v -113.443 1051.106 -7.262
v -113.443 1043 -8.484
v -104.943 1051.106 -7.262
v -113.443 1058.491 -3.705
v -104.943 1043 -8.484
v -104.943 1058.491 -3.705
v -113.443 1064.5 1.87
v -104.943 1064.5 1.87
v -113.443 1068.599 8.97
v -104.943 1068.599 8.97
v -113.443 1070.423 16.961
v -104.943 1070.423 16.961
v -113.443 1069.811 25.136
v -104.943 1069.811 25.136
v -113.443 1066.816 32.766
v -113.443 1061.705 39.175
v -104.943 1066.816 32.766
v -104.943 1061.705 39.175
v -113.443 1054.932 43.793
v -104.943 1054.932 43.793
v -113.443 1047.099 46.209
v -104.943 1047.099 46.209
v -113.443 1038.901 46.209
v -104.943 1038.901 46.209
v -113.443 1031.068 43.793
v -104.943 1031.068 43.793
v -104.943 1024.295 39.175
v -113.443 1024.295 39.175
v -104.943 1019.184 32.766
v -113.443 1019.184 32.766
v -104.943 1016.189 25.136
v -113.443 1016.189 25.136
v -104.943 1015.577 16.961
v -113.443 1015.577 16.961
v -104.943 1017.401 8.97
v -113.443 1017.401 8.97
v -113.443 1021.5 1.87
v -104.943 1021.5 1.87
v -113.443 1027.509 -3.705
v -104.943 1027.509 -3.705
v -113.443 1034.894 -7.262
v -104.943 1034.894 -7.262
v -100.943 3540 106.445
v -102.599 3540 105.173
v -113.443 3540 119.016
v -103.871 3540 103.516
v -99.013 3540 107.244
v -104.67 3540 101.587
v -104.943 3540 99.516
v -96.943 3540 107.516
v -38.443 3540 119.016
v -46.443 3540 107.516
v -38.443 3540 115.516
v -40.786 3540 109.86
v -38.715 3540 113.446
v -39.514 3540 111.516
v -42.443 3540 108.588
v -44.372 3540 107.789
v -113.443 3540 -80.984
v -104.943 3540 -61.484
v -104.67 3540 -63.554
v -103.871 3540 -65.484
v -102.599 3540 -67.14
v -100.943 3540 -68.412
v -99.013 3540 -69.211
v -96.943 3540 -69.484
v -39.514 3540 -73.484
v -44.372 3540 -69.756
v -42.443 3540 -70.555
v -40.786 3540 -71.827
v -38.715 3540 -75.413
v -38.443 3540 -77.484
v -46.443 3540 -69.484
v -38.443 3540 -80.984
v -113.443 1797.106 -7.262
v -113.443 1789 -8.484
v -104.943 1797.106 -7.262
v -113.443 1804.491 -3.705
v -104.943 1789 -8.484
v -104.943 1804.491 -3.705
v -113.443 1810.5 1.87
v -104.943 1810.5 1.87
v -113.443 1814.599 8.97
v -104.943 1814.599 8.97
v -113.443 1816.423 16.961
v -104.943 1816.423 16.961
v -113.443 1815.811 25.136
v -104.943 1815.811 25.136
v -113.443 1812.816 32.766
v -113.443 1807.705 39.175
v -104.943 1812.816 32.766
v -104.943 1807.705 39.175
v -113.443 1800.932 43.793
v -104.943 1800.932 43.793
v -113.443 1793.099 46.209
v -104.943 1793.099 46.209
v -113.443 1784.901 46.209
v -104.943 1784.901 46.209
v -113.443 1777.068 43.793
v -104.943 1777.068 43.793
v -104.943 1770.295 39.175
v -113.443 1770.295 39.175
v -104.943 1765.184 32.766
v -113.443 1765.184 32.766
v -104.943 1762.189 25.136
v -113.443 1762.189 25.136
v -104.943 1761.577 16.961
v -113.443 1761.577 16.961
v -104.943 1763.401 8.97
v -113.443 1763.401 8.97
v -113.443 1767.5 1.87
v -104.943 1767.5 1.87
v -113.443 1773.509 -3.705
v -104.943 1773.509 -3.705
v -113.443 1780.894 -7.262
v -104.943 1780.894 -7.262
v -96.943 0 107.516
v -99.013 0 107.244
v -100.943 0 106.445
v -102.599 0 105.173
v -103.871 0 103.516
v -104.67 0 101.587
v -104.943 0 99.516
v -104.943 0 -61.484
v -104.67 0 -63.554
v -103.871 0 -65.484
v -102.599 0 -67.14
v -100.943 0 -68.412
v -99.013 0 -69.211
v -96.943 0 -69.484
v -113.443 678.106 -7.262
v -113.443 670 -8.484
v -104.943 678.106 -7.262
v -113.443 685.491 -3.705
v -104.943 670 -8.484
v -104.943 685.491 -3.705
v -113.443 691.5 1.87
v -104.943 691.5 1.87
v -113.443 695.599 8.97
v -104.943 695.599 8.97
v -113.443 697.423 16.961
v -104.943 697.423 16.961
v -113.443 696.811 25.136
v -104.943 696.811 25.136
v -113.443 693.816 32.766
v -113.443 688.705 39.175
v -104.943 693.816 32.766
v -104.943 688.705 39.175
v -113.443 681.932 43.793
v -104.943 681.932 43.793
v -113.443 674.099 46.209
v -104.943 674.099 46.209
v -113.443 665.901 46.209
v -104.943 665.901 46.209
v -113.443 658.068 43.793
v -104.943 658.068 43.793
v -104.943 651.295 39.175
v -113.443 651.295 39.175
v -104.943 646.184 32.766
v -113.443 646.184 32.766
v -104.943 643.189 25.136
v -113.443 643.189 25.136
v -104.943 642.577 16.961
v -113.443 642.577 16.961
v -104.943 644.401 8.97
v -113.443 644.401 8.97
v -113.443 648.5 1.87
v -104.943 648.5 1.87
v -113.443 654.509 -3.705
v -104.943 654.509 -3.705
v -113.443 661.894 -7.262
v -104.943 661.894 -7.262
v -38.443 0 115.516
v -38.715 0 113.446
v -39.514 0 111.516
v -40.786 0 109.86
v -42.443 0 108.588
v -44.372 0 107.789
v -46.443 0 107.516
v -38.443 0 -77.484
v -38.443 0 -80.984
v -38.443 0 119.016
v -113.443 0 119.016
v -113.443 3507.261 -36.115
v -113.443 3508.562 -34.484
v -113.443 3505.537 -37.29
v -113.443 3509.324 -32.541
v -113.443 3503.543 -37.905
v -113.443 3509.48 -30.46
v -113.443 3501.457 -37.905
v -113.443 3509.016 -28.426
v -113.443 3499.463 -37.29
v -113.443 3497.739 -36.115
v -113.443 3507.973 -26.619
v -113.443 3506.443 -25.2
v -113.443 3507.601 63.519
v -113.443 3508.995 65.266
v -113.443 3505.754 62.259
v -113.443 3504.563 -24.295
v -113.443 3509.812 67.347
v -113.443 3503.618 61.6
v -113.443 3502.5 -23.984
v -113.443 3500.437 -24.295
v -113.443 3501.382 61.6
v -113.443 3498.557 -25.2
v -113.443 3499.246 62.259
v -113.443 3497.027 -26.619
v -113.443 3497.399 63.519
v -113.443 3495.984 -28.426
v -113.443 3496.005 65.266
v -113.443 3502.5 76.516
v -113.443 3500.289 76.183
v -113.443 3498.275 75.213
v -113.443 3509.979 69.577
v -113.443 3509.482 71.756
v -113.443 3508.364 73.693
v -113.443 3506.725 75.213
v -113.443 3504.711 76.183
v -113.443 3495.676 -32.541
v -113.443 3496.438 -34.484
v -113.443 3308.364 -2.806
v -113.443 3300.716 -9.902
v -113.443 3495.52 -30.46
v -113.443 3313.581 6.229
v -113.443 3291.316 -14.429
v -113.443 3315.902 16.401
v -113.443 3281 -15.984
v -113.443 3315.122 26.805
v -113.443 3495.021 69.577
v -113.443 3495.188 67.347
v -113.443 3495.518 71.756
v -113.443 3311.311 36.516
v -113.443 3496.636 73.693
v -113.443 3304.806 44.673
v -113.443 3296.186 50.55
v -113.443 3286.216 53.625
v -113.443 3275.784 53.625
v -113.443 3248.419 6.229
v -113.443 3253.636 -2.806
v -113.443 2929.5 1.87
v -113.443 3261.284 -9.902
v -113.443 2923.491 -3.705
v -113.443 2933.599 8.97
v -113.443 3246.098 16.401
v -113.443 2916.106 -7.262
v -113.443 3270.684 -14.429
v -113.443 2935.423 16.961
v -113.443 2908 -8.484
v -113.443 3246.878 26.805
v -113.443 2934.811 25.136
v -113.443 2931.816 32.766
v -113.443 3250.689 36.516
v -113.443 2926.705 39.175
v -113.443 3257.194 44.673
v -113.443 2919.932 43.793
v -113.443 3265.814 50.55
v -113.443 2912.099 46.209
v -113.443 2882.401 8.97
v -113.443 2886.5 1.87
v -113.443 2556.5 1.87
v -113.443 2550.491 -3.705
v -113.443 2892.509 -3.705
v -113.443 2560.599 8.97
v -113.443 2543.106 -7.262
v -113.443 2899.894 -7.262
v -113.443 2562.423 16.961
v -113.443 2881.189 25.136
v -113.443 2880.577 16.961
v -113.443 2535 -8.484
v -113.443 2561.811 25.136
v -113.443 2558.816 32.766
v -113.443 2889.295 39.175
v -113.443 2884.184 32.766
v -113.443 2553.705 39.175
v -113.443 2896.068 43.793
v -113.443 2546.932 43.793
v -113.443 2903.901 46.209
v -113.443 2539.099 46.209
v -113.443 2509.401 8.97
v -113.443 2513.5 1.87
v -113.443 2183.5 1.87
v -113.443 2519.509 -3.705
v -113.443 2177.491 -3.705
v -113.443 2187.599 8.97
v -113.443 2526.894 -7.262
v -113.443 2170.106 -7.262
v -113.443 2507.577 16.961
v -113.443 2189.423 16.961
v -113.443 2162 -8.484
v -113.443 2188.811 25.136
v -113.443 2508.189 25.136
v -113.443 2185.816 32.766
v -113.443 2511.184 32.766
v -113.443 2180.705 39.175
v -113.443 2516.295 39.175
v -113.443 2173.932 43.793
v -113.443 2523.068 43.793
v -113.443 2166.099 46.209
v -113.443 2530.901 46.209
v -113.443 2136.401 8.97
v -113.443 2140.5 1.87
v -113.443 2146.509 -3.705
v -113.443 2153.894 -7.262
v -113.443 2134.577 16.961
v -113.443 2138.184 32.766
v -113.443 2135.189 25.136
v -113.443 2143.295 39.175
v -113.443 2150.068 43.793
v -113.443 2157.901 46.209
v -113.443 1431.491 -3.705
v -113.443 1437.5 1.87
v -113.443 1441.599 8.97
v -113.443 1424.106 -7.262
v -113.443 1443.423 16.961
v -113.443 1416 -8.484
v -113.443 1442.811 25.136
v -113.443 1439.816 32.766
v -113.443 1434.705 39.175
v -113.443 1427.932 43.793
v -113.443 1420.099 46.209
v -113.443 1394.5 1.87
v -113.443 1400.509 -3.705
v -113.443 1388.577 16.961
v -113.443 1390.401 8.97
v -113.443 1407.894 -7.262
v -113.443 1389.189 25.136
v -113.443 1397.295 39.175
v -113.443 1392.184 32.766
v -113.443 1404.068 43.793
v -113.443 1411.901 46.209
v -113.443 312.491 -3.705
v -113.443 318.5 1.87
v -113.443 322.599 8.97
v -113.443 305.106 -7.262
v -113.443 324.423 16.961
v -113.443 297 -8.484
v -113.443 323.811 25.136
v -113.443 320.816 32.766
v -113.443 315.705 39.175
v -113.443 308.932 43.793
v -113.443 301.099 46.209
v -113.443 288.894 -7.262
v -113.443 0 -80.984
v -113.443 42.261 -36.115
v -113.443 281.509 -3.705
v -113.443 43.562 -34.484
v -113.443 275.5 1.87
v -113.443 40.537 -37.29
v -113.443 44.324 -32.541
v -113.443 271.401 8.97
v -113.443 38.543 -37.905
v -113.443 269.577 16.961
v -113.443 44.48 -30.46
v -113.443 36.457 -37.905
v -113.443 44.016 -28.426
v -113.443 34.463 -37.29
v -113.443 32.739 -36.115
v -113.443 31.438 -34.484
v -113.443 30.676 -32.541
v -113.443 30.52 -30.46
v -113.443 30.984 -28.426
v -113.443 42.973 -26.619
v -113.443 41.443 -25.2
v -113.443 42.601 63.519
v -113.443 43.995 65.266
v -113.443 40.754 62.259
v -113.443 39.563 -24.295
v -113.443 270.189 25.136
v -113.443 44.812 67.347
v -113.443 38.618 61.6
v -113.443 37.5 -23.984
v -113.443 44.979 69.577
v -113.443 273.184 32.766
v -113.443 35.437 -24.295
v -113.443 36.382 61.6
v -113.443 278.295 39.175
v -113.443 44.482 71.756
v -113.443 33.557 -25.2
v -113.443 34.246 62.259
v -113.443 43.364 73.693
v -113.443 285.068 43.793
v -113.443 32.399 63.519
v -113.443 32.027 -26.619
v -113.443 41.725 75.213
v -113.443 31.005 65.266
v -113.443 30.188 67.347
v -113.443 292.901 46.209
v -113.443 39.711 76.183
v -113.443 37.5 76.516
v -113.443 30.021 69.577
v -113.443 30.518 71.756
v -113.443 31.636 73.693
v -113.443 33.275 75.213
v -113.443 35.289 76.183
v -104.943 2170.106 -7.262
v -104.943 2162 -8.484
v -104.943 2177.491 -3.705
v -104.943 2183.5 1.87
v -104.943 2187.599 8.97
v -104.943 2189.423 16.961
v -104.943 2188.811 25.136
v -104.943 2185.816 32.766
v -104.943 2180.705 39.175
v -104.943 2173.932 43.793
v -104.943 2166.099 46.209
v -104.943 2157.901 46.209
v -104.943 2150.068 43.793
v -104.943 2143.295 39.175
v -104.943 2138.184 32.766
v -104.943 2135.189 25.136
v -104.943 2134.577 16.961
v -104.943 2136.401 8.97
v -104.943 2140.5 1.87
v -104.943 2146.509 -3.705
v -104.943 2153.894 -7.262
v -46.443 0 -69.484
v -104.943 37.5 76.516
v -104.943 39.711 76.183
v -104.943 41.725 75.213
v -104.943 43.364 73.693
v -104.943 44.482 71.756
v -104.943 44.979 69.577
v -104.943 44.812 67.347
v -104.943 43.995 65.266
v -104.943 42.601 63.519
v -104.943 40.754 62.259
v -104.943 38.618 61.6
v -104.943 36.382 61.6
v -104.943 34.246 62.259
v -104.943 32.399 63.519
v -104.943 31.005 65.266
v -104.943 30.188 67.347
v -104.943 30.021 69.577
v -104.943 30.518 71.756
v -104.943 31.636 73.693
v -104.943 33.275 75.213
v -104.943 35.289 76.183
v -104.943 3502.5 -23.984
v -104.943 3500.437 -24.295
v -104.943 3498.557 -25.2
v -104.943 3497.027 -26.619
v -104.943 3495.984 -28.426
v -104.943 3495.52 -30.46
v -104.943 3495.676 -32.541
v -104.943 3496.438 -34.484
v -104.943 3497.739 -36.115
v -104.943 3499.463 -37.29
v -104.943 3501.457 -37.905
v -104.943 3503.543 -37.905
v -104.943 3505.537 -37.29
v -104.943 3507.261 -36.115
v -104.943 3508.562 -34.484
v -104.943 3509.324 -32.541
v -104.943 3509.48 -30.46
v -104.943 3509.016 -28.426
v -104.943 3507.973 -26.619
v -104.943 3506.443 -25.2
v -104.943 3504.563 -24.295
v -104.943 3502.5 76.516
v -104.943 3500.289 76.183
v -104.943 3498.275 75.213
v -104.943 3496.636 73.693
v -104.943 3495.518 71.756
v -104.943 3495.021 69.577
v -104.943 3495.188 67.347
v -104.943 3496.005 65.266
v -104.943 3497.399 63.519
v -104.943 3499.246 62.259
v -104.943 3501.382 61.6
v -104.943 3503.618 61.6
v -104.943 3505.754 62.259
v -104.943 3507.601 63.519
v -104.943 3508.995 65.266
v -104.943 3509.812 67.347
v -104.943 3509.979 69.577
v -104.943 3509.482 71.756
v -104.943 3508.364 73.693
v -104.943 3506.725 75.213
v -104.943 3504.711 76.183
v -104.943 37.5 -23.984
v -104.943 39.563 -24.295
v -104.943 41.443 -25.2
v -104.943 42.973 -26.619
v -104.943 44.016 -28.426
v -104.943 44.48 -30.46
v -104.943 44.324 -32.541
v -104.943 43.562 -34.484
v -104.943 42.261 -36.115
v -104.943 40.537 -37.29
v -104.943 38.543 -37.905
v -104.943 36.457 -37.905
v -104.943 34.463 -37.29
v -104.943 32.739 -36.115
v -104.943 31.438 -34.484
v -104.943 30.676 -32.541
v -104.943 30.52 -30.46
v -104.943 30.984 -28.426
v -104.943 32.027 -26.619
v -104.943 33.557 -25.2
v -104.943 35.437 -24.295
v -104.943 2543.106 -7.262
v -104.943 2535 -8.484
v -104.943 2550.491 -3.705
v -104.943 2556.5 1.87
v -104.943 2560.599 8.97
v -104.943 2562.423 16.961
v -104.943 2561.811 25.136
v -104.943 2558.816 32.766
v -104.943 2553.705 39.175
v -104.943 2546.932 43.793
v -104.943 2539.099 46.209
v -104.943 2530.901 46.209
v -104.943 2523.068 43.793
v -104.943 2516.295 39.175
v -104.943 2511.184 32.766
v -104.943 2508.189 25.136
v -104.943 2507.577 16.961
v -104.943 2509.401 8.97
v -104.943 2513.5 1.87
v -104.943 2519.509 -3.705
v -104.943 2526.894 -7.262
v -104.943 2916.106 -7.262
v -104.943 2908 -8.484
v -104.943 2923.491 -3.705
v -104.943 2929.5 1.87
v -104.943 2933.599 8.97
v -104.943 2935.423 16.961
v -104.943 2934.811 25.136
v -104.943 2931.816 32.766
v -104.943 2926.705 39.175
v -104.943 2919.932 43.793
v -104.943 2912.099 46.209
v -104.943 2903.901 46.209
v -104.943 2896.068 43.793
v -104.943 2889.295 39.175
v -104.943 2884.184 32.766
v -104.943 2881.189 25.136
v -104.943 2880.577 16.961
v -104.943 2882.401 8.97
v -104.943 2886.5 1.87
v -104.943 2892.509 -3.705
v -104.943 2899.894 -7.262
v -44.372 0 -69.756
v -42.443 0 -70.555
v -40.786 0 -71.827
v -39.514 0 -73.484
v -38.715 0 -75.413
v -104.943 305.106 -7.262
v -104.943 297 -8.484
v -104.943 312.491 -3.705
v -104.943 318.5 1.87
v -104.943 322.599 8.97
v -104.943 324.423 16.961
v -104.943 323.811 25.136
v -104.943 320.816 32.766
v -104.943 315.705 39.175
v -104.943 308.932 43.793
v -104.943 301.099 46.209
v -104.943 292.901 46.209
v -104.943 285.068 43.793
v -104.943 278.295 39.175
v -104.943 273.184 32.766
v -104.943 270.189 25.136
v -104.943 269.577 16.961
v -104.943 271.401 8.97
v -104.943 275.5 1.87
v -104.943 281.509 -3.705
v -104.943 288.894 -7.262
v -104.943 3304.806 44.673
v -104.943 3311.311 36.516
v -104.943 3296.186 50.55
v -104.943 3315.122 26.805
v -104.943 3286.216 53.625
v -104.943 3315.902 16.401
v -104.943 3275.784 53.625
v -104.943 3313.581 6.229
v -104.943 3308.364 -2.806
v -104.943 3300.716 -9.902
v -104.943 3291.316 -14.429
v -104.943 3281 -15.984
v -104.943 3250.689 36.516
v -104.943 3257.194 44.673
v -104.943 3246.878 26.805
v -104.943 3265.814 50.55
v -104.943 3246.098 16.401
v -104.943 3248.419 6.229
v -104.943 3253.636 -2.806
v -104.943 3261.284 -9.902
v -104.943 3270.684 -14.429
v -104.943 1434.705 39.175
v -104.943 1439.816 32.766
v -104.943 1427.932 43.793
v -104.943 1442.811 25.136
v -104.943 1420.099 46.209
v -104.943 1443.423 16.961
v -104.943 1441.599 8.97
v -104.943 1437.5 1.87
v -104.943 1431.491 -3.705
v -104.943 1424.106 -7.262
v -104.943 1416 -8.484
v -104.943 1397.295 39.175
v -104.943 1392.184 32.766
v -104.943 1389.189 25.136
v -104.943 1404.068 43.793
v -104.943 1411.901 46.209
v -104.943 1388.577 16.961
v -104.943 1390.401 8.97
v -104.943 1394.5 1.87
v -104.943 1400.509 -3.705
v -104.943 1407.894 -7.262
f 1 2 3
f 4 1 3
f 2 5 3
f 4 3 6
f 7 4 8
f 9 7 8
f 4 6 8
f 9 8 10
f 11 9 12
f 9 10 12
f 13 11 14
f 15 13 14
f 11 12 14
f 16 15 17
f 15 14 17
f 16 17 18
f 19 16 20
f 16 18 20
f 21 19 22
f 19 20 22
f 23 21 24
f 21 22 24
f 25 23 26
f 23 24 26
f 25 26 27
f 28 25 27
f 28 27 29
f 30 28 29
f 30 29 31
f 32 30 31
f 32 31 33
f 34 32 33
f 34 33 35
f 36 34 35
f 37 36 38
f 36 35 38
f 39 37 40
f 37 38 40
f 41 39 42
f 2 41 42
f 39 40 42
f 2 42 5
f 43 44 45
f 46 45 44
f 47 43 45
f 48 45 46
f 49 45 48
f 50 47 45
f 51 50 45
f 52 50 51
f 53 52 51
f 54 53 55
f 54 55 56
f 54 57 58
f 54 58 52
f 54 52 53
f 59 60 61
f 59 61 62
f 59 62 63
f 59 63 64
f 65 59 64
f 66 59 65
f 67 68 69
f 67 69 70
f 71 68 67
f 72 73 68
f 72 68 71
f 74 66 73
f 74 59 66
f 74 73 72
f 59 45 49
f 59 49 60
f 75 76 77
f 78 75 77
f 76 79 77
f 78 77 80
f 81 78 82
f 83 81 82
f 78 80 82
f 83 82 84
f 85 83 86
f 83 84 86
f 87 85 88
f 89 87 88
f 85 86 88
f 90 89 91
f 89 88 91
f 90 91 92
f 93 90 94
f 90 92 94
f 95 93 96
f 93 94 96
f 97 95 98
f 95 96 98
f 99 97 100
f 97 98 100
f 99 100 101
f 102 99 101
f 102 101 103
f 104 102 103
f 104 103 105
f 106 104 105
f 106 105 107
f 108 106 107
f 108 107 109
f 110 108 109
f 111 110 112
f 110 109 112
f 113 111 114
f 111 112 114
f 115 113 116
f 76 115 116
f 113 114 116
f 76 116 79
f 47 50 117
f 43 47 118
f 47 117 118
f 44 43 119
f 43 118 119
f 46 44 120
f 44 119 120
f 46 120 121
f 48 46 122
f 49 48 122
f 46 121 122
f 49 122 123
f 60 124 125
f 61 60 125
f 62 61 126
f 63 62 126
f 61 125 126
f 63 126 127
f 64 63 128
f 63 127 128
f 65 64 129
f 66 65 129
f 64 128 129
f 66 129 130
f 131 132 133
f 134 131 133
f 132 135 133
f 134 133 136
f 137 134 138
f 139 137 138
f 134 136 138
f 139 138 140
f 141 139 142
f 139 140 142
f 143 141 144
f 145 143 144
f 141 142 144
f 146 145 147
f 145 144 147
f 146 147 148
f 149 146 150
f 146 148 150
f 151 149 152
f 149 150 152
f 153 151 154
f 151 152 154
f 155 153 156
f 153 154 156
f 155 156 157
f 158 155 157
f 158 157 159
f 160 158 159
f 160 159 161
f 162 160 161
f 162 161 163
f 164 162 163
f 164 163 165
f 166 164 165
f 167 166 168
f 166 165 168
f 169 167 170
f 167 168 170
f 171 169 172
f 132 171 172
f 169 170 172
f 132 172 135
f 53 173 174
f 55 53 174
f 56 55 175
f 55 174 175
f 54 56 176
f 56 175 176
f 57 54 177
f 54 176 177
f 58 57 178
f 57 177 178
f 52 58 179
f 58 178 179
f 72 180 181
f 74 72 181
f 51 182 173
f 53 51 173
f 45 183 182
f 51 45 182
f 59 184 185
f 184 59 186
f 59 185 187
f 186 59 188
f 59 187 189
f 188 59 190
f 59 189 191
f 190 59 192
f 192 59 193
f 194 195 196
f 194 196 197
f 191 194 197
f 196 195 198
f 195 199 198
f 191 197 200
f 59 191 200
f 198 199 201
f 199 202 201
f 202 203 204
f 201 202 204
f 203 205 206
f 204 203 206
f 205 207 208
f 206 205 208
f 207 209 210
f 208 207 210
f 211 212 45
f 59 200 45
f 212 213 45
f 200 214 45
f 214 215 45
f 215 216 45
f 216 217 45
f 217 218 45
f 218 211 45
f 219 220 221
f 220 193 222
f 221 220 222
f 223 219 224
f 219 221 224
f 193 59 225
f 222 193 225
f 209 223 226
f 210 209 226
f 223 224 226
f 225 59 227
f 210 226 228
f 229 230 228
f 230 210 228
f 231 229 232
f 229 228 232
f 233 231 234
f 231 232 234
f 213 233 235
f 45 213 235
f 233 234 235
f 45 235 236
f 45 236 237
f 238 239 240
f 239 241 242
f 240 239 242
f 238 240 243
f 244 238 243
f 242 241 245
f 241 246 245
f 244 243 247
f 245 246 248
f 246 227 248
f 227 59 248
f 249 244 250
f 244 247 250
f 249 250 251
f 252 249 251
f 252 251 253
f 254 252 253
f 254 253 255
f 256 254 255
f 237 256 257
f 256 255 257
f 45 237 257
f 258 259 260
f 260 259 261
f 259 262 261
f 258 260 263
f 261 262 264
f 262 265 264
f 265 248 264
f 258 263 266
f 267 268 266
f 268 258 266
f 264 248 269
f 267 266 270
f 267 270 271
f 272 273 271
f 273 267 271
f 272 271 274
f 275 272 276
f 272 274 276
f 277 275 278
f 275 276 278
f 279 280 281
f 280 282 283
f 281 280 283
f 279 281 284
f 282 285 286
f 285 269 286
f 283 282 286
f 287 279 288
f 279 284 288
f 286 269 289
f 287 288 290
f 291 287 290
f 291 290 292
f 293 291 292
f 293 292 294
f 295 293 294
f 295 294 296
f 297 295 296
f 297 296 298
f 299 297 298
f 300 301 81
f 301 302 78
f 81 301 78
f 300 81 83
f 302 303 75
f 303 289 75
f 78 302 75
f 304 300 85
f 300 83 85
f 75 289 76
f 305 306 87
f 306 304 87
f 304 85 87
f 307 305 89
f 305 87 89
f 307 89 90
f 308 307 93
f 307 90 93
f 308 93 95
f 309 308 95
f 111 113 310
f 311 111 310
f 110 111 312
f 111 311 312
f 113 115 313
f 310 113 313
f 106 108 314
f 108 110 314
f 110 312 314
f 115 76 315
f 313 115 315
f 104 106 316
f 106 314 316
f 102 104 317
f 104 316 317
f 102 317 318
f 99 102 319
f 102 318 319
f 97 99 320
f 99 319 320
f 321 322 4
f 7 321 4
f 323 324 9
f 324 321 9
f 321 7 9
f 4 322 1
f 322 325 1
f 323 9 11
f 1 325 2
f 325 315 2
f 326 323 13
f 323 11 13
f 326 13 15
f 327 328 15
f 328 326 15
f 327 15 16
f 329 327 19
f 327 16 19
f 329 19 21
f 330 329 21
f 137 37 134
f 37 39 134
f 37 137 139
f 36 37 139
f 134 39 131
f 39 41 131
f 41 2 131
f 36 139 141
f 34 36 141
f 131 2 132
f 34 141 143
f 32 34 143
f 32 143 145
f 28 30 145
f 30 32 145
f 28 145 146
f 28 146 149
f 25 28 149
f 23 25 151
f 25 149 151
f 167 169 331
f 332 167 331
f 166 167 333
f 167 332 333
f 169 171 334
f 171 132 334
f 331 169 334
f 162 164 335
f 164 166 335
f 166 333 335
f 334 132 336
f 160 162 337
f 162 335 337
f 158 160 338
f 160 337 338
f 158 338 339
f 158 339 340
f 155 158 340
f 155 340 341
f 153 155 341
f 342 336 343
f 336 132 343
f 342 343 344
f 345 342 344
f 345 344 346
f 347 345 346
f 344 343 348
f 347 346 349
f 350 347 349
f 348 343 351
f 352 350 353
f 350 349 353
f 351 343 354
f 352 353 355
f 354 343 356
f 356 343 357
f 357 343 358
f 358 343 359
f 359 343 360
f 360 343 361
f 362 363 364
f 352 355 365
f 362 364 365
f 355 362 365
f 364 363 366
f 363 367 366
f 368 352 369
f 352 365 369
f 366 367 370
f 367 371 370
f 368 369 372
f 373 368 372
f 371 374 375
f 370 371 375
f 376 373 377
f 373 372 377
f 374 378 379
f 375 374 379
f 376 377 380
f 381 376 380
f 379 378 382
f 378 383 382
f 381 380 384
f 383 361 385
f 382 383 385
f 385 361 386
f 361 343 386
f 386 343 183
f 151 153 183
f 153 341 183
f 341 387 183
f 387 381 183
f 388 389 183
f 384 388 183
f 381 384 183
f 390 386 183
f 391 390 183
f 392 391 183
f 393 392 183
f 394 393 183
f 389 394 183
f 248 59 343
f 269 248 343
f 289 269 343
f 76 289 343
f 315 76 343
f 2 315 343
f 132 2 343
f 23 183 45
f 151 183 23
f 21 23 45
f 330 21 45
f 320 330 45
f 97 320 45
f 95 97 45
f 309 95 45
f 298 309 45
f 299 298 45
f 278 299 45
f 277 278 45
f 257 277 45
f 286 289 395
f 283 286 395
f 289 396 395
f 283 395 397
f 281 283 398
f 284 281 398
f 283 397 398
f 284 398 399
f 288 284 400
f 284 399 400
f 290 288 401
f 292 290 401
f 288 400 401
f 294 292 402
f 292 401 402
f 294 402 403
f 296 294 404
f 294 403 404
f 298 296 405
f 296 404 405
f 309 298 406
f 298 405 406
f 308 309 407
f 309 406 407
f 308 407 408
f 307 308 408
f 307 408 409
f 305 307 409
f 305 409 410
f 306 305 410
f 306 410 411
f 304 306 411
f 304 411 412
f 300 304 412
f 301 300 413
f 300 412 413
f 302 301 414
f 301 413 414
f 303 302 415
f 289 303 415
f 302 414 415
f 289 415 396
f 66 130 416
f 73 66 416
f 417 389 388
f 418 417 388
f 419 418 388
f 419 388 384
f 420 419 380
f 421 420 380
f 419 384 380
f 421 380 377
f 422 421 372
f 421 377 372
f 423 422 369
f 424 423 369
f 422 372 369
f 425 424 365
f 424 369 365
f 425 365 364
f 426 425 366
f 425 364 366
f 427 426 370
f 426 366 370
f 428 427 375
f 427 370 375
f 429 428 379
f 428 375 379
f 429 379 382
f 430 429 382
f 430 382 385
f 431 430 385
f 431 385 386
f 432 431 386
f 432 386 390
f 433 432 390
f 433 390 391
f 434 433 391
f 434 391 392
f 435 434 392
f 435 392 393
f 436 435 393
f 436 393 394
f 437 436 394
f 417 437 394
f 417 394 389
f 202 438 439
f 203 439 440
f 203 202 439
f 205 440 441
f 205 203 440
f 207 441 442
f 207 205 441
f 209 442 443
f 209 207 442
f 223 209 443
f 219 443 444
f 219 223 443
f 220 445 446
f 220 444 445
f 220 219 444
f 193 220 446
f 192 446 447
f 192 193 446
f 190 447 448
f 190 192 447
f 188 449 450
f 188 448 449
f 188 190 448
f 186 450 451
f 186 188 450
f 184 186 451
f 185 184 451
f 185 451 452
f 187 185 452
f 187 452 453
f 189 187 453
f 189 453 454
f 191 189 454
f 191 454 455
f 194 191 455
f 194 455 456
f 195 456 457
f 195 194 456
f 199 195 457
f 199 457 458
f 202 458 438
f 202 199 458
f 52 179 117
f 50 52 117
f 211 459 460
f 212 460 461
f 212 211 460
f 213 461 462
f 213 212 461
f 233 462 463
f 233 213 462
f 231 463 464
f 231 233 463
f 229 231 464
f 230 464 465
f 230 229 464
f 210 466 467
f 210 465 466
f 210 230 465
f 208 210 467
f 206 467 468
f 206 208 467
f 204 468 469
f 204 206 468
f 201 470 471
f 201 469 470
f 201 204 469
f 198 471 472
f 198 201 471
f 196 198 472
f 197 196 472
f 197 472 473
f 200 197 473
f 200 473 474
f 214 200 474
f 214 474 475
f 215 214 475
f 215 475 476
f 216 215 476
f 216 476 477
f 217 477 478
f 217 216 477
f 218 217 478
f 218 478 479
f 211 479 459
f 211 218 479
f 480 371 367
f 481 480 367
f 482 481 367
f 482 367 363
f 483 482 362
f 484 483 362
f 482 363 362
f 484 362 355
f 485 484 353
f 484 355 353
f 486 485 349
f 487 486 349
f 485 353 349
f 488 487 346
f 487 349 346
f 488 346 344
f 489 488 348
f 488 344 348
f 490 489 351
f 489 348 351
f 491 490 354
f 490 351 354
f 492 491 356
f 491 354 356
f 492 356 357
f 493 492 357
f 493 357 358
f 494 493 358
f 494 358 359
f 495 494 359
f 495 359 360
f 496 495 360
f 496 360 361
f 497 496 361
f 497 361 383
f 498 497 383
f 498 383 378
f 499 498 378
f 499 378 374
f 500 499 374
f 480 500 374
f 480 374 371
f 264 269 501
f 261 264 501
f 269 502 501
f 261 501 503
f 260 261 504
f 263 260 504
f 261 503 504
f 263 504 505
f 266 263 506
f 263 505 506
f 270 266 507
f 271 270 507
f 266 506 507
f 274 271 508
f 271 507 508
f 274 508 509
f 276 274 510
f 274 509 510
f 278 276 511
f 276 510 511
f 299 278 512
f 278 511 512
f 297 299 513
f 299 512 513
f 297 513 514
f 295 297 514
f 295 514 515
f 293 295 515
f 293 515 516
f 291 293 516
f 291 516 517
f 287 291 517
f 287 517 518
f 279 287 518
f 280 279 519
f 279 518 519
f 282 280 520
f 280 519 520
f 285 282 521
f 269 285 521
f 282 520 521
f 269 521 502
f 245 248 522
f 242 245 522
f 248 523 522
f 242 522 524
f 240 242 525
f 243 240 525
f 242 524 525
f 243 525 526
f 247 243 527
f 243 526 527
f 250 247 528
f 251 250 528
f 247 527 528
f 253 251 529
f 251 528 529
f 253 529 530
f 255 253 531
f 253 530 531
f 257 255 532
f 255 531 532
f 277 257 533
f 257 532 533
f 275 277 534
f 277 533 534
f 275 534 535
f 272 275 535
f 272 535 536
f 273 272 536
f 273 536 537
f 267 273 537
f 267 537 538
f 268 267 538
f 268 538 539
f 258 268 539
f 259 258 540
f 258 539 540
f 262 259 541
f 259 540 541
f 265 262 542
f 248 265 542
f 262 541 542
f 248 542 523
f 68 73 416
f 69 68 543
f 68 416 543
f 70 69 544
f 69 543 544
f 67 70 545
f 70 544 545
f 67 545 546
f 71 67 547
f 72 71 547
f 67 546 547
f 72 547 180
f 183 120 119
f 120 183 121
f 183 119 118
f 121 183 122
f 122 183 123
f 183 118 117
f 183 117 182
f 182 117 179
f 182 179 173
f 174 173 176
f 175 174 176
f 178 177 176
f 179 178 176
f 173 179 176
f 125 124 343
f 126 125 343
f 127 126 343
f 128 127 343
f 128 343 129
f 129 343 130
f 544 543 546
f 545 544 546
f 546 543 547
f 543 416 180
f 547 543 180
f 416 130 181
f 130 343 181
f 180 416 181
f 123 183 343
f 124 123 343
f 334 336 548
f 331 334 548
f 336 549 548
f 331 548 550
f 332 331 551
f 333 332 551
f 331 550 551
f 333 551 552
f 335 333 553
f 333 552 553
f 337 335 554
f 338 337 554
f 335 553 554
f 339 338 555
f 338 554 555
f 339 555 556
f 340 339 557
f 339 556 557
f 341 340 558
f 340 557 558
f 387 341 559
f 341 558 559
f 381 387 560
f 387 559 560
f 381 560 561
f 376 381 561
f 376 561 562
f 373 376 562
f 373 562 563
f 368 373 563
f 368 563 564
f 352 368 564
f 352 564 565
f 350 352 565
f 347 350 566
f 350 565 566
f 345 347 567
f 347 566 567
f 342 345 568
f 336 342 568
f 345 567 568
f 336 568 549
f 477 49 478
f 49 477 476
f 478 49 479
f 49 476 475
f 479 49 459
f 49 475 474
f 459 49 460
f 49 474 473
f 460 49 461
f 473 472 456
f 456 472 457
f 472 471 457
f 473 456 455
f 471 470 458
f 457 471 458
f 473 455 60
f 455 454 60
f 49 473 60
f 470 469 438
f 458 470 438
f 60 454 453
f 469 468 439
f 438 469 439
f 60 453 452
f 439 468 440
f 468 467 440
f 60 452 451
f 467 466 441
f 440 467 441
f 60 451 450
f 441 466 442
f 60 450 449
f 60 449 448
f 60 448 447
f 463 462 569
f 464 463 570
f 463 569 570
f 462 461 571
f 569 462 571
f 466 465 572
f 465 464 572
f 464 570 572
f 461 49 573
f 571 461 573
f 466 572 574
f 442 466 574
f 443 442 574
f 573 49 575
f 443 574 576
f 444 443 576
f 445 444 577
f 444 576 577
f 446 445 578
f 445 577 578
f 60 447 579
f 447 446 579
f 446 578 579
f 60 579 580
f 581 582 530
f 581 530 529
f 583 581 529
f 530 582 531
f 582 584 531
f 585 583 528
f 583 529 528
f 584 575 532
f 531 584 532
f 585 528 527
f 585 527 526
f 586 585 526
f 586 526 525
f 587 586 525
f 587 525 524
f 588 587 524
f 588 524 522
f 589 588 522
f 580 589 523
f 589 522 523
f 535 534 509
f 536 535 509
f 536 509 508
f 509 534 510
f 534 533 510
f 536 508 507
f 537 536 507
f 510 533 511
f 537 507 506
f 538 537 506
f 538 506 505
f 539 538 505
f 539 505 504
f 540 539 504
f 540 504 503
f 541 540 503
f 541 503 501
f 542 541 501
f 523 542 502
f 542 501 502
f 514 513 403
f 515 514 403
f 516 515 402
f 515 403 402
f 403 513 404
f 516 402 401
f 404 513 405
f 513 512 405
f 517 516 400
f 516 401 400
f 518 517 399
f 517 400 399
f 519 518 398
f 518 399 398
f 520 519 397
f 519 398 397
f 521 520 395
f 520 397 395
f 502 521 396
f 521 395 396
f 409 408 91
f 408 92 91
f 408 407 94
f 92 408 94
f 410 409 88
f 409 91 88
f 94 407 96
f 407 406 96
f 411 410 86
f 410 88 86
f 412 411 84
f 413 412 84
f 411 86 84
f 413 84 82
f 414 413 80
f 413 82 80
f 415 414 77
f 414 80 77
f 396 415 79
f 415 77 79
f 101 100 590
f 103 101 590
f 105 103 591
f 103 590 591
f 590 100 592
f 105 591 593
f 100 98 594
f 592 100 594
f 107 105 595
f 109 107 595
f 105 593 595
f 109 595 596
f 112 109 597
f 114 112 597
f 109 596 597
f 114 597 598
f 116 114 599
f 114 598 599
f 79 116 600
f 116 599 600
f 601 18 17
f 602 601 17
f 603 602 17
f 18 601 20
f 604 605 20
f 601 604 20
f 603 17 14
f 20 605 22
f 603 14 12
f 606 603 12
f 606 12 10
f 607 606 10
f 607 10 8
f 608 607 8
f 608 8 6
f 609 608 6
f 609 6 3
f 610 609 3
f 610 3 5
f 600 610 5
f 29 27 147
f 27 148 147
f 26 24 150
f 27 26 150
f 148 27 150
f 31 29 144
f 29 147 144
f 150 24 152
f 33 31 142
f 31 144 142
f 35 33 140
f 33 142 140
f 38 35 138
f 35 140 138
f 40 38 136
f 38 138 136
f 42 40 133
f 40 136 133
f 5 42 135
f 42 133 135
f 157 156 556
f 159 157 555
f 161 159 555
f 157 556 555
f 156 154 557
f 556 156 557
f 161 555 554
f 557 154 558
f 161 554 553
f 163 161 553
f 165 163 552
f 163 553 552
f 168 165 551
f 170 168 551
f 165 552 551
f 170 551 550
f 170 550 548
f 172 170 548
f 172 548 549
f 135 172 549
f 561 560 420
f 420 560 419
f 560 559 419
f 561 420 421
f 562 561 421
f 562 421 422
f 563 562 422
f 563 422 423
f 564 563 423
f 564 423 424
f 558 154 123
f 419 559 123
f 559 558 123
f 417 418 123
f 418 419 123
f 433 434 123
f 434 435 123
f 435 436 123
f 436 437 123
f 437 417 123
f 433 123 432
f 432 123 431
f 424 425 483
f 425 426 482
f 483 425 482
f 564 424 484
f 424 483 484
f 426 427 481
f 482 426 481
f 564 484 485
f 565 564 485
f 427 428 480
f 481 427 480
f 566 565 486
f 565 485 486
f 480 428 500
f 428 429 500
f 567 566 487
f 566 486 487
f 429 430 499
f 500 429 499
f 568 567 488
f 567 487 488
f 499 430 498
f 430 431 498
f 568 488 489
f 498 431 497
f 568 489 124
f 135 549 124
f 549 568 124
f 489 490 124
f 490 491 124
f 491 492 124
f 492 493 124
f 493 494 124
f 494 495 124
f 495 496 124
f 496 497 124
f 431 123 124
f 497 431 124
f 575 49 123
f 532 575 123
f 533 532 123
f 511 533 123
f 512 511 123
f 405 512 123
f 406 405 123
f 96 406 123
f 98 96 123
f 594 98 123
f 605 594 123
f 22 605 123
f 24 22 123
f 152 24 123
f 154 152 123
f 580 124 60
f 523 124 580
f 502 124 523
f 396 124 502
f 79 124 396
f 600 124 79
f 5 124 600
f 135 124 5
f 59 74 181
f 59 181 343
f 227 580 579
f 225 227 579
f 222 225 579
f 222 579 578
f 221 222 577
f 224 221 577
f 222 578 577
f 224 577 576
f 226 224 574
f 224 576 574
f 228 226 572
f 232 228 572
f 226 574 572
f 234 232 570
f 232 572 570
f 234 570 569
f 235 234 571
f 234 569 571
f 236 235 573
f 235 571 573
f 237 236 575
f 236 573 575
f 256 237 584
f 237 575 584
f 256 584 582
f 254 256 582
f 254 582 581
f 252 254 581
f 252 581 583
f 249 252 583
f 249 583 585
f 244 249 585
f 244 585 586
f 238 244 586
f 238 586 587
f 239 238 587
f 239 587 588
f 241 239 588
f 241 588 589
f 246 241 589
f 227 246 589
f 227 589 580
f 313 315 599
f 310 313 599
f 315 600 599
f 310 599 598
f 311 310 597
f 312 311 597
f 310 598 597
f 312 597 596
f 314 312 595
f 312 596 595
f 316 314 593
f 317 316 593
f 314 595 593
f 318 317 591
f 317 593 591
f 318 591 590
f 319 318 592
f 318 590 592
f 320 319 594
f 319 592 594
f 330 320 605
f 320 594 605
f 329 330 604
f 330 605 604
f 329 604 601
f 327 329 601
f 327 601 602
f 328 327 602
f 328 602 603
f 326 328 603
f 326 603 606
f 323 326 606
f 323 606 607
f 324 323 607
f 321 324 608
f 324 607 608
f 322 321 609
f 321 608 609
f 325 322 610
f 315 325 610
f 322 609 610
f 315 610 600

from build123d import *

# Parameters (mm, degrees)
BOSS_EXTRUDE1_DEPTH = 3540
SKETCH3_R           = 7
SKETCH3_R_2         = 7.5
CUT_EXTRUDE2_DEPTH  = 3540
SKETCH4_R           = 27.5
CUT_EXTRUDE3_DEPTH  = 3543.624331186
LPATTERN2_COUNT     = 9
LPATTERN2_PITCH     = 373
SKETCH6_R           = 35
CUT_EXTRUDE5_DEPTH  = 20


with BuildPart() as part:
    # Sketch1 → Boss-Extrude1 (new body)
    with BuildSketch(Plane(origin=(0, 0, 0), x_dir=(1, 0, 0), z_dir=(0, 1, 0))):
        with BuildLine():
            Line((-38.442622951, 80.983606557), (-113.442622951, 80.983606557))
            Line((-113.442622951, 80.983606557), (-113.442622951, -119.016393443))
            Line((-113.442622951, -119.016393443), (-38.442622951, -119.016393443))
            Line((-38.442622951, -119.016393443), (-38.442622951, -115.516393443))
            ThreePointArc((-38.442622951, -115.516393443), (-40.785768701, -109.859539193), (-46.442622951, -107.516393443))
            Line((-46.442622951, -107.516393443), (-96.942622951, -107.516393443))
            ThreePointArc((-96.942622951, -107.516393443), (-102.5994772, -105.173247692), (-104.942622951, -99.516393443))
            Line((-104.942622951, -99.516393443), (-104.942622951, 61.483606557))
            ThreePointArc((-104.942622951, 61.483606557), (-102.5994772, 67.140460807), (-96.942622951, 69.483606557))
            Line((-96.942622951, 69.483606557), (-46.442622951, 69.483606557))
            ThreePointArc((-46.442622951, 69.483606557), (-40.785768701, 71.826752308), (-38.442622951, 77.483606557))
            Line((-38.442622951, 77.483606557), (-38.442622951, 80.983606557))
        make_face()
    extrude(amount=BOSS_EXTRUDE1_DEPTH)

    # Sketch3 → Cut-Extrude2 (cut)
    with BuildSketch(Plane.ZY.offset(113.442622951)):
        with Locations((-30.983606557, 37.5)):
            Circle(SKETCH3_R)
        with Locations((69.016393443, 37.5)):
            Circle(SKETCH3_R_2)
    cut_extrude2 = extrude(amount=-CUT_EXTRUDE2_DEPTH, mode=Mode.SUBTRACT)

    # Mirror1: Cut-Extrude2 across plane
    add(cut_extrude2.mirror(Plane(origin=(0, 1770, 0), x_dir=(0, 0, 1), z_dir=(0, -1, 0))), mode=Mode.SUBTRACT)

    # Sketch4 → Cut-Extrude3 (cut, symmetric)
    with BuildSketch(Plane(origin=(-104.942622951, 0, 0), x_dir=(0, 0, -1), z_dir=(1, 0, 0))):
        with Locations((-19.016393443, 297)):
            Circle(SKETCH4_R)
    cut_extrude3 = extrude(amount=CUT_EXTRUDE3_DEPTH, both=True, mode=Mode.SUBTRACT)

    # LPattern2: Cut-Extrude3 ×9
    with Locations(*[(0, i * LPATTERN2_PITCH, 0) for i in range(1, LPATTERN2_COUNT)]):
        add(cut_extrude3, mode=Mode.SUBTRACT)

    # Sketch6 → Cut-Extrude5 (cut)
    with BuildSketch(Plane(origin=(-104.942622951, 0, 0), x_dir=(0, 0, -1), z_dir=(1, 0, 0))):
        with Locations((-19.016393443, 3281)):
            Circle(SKETCH6_R)
    extrude(amount=-CUT_EXTRUDE5_DEPTH, mode=Mode.SUBTRACT)


solid = part.part
